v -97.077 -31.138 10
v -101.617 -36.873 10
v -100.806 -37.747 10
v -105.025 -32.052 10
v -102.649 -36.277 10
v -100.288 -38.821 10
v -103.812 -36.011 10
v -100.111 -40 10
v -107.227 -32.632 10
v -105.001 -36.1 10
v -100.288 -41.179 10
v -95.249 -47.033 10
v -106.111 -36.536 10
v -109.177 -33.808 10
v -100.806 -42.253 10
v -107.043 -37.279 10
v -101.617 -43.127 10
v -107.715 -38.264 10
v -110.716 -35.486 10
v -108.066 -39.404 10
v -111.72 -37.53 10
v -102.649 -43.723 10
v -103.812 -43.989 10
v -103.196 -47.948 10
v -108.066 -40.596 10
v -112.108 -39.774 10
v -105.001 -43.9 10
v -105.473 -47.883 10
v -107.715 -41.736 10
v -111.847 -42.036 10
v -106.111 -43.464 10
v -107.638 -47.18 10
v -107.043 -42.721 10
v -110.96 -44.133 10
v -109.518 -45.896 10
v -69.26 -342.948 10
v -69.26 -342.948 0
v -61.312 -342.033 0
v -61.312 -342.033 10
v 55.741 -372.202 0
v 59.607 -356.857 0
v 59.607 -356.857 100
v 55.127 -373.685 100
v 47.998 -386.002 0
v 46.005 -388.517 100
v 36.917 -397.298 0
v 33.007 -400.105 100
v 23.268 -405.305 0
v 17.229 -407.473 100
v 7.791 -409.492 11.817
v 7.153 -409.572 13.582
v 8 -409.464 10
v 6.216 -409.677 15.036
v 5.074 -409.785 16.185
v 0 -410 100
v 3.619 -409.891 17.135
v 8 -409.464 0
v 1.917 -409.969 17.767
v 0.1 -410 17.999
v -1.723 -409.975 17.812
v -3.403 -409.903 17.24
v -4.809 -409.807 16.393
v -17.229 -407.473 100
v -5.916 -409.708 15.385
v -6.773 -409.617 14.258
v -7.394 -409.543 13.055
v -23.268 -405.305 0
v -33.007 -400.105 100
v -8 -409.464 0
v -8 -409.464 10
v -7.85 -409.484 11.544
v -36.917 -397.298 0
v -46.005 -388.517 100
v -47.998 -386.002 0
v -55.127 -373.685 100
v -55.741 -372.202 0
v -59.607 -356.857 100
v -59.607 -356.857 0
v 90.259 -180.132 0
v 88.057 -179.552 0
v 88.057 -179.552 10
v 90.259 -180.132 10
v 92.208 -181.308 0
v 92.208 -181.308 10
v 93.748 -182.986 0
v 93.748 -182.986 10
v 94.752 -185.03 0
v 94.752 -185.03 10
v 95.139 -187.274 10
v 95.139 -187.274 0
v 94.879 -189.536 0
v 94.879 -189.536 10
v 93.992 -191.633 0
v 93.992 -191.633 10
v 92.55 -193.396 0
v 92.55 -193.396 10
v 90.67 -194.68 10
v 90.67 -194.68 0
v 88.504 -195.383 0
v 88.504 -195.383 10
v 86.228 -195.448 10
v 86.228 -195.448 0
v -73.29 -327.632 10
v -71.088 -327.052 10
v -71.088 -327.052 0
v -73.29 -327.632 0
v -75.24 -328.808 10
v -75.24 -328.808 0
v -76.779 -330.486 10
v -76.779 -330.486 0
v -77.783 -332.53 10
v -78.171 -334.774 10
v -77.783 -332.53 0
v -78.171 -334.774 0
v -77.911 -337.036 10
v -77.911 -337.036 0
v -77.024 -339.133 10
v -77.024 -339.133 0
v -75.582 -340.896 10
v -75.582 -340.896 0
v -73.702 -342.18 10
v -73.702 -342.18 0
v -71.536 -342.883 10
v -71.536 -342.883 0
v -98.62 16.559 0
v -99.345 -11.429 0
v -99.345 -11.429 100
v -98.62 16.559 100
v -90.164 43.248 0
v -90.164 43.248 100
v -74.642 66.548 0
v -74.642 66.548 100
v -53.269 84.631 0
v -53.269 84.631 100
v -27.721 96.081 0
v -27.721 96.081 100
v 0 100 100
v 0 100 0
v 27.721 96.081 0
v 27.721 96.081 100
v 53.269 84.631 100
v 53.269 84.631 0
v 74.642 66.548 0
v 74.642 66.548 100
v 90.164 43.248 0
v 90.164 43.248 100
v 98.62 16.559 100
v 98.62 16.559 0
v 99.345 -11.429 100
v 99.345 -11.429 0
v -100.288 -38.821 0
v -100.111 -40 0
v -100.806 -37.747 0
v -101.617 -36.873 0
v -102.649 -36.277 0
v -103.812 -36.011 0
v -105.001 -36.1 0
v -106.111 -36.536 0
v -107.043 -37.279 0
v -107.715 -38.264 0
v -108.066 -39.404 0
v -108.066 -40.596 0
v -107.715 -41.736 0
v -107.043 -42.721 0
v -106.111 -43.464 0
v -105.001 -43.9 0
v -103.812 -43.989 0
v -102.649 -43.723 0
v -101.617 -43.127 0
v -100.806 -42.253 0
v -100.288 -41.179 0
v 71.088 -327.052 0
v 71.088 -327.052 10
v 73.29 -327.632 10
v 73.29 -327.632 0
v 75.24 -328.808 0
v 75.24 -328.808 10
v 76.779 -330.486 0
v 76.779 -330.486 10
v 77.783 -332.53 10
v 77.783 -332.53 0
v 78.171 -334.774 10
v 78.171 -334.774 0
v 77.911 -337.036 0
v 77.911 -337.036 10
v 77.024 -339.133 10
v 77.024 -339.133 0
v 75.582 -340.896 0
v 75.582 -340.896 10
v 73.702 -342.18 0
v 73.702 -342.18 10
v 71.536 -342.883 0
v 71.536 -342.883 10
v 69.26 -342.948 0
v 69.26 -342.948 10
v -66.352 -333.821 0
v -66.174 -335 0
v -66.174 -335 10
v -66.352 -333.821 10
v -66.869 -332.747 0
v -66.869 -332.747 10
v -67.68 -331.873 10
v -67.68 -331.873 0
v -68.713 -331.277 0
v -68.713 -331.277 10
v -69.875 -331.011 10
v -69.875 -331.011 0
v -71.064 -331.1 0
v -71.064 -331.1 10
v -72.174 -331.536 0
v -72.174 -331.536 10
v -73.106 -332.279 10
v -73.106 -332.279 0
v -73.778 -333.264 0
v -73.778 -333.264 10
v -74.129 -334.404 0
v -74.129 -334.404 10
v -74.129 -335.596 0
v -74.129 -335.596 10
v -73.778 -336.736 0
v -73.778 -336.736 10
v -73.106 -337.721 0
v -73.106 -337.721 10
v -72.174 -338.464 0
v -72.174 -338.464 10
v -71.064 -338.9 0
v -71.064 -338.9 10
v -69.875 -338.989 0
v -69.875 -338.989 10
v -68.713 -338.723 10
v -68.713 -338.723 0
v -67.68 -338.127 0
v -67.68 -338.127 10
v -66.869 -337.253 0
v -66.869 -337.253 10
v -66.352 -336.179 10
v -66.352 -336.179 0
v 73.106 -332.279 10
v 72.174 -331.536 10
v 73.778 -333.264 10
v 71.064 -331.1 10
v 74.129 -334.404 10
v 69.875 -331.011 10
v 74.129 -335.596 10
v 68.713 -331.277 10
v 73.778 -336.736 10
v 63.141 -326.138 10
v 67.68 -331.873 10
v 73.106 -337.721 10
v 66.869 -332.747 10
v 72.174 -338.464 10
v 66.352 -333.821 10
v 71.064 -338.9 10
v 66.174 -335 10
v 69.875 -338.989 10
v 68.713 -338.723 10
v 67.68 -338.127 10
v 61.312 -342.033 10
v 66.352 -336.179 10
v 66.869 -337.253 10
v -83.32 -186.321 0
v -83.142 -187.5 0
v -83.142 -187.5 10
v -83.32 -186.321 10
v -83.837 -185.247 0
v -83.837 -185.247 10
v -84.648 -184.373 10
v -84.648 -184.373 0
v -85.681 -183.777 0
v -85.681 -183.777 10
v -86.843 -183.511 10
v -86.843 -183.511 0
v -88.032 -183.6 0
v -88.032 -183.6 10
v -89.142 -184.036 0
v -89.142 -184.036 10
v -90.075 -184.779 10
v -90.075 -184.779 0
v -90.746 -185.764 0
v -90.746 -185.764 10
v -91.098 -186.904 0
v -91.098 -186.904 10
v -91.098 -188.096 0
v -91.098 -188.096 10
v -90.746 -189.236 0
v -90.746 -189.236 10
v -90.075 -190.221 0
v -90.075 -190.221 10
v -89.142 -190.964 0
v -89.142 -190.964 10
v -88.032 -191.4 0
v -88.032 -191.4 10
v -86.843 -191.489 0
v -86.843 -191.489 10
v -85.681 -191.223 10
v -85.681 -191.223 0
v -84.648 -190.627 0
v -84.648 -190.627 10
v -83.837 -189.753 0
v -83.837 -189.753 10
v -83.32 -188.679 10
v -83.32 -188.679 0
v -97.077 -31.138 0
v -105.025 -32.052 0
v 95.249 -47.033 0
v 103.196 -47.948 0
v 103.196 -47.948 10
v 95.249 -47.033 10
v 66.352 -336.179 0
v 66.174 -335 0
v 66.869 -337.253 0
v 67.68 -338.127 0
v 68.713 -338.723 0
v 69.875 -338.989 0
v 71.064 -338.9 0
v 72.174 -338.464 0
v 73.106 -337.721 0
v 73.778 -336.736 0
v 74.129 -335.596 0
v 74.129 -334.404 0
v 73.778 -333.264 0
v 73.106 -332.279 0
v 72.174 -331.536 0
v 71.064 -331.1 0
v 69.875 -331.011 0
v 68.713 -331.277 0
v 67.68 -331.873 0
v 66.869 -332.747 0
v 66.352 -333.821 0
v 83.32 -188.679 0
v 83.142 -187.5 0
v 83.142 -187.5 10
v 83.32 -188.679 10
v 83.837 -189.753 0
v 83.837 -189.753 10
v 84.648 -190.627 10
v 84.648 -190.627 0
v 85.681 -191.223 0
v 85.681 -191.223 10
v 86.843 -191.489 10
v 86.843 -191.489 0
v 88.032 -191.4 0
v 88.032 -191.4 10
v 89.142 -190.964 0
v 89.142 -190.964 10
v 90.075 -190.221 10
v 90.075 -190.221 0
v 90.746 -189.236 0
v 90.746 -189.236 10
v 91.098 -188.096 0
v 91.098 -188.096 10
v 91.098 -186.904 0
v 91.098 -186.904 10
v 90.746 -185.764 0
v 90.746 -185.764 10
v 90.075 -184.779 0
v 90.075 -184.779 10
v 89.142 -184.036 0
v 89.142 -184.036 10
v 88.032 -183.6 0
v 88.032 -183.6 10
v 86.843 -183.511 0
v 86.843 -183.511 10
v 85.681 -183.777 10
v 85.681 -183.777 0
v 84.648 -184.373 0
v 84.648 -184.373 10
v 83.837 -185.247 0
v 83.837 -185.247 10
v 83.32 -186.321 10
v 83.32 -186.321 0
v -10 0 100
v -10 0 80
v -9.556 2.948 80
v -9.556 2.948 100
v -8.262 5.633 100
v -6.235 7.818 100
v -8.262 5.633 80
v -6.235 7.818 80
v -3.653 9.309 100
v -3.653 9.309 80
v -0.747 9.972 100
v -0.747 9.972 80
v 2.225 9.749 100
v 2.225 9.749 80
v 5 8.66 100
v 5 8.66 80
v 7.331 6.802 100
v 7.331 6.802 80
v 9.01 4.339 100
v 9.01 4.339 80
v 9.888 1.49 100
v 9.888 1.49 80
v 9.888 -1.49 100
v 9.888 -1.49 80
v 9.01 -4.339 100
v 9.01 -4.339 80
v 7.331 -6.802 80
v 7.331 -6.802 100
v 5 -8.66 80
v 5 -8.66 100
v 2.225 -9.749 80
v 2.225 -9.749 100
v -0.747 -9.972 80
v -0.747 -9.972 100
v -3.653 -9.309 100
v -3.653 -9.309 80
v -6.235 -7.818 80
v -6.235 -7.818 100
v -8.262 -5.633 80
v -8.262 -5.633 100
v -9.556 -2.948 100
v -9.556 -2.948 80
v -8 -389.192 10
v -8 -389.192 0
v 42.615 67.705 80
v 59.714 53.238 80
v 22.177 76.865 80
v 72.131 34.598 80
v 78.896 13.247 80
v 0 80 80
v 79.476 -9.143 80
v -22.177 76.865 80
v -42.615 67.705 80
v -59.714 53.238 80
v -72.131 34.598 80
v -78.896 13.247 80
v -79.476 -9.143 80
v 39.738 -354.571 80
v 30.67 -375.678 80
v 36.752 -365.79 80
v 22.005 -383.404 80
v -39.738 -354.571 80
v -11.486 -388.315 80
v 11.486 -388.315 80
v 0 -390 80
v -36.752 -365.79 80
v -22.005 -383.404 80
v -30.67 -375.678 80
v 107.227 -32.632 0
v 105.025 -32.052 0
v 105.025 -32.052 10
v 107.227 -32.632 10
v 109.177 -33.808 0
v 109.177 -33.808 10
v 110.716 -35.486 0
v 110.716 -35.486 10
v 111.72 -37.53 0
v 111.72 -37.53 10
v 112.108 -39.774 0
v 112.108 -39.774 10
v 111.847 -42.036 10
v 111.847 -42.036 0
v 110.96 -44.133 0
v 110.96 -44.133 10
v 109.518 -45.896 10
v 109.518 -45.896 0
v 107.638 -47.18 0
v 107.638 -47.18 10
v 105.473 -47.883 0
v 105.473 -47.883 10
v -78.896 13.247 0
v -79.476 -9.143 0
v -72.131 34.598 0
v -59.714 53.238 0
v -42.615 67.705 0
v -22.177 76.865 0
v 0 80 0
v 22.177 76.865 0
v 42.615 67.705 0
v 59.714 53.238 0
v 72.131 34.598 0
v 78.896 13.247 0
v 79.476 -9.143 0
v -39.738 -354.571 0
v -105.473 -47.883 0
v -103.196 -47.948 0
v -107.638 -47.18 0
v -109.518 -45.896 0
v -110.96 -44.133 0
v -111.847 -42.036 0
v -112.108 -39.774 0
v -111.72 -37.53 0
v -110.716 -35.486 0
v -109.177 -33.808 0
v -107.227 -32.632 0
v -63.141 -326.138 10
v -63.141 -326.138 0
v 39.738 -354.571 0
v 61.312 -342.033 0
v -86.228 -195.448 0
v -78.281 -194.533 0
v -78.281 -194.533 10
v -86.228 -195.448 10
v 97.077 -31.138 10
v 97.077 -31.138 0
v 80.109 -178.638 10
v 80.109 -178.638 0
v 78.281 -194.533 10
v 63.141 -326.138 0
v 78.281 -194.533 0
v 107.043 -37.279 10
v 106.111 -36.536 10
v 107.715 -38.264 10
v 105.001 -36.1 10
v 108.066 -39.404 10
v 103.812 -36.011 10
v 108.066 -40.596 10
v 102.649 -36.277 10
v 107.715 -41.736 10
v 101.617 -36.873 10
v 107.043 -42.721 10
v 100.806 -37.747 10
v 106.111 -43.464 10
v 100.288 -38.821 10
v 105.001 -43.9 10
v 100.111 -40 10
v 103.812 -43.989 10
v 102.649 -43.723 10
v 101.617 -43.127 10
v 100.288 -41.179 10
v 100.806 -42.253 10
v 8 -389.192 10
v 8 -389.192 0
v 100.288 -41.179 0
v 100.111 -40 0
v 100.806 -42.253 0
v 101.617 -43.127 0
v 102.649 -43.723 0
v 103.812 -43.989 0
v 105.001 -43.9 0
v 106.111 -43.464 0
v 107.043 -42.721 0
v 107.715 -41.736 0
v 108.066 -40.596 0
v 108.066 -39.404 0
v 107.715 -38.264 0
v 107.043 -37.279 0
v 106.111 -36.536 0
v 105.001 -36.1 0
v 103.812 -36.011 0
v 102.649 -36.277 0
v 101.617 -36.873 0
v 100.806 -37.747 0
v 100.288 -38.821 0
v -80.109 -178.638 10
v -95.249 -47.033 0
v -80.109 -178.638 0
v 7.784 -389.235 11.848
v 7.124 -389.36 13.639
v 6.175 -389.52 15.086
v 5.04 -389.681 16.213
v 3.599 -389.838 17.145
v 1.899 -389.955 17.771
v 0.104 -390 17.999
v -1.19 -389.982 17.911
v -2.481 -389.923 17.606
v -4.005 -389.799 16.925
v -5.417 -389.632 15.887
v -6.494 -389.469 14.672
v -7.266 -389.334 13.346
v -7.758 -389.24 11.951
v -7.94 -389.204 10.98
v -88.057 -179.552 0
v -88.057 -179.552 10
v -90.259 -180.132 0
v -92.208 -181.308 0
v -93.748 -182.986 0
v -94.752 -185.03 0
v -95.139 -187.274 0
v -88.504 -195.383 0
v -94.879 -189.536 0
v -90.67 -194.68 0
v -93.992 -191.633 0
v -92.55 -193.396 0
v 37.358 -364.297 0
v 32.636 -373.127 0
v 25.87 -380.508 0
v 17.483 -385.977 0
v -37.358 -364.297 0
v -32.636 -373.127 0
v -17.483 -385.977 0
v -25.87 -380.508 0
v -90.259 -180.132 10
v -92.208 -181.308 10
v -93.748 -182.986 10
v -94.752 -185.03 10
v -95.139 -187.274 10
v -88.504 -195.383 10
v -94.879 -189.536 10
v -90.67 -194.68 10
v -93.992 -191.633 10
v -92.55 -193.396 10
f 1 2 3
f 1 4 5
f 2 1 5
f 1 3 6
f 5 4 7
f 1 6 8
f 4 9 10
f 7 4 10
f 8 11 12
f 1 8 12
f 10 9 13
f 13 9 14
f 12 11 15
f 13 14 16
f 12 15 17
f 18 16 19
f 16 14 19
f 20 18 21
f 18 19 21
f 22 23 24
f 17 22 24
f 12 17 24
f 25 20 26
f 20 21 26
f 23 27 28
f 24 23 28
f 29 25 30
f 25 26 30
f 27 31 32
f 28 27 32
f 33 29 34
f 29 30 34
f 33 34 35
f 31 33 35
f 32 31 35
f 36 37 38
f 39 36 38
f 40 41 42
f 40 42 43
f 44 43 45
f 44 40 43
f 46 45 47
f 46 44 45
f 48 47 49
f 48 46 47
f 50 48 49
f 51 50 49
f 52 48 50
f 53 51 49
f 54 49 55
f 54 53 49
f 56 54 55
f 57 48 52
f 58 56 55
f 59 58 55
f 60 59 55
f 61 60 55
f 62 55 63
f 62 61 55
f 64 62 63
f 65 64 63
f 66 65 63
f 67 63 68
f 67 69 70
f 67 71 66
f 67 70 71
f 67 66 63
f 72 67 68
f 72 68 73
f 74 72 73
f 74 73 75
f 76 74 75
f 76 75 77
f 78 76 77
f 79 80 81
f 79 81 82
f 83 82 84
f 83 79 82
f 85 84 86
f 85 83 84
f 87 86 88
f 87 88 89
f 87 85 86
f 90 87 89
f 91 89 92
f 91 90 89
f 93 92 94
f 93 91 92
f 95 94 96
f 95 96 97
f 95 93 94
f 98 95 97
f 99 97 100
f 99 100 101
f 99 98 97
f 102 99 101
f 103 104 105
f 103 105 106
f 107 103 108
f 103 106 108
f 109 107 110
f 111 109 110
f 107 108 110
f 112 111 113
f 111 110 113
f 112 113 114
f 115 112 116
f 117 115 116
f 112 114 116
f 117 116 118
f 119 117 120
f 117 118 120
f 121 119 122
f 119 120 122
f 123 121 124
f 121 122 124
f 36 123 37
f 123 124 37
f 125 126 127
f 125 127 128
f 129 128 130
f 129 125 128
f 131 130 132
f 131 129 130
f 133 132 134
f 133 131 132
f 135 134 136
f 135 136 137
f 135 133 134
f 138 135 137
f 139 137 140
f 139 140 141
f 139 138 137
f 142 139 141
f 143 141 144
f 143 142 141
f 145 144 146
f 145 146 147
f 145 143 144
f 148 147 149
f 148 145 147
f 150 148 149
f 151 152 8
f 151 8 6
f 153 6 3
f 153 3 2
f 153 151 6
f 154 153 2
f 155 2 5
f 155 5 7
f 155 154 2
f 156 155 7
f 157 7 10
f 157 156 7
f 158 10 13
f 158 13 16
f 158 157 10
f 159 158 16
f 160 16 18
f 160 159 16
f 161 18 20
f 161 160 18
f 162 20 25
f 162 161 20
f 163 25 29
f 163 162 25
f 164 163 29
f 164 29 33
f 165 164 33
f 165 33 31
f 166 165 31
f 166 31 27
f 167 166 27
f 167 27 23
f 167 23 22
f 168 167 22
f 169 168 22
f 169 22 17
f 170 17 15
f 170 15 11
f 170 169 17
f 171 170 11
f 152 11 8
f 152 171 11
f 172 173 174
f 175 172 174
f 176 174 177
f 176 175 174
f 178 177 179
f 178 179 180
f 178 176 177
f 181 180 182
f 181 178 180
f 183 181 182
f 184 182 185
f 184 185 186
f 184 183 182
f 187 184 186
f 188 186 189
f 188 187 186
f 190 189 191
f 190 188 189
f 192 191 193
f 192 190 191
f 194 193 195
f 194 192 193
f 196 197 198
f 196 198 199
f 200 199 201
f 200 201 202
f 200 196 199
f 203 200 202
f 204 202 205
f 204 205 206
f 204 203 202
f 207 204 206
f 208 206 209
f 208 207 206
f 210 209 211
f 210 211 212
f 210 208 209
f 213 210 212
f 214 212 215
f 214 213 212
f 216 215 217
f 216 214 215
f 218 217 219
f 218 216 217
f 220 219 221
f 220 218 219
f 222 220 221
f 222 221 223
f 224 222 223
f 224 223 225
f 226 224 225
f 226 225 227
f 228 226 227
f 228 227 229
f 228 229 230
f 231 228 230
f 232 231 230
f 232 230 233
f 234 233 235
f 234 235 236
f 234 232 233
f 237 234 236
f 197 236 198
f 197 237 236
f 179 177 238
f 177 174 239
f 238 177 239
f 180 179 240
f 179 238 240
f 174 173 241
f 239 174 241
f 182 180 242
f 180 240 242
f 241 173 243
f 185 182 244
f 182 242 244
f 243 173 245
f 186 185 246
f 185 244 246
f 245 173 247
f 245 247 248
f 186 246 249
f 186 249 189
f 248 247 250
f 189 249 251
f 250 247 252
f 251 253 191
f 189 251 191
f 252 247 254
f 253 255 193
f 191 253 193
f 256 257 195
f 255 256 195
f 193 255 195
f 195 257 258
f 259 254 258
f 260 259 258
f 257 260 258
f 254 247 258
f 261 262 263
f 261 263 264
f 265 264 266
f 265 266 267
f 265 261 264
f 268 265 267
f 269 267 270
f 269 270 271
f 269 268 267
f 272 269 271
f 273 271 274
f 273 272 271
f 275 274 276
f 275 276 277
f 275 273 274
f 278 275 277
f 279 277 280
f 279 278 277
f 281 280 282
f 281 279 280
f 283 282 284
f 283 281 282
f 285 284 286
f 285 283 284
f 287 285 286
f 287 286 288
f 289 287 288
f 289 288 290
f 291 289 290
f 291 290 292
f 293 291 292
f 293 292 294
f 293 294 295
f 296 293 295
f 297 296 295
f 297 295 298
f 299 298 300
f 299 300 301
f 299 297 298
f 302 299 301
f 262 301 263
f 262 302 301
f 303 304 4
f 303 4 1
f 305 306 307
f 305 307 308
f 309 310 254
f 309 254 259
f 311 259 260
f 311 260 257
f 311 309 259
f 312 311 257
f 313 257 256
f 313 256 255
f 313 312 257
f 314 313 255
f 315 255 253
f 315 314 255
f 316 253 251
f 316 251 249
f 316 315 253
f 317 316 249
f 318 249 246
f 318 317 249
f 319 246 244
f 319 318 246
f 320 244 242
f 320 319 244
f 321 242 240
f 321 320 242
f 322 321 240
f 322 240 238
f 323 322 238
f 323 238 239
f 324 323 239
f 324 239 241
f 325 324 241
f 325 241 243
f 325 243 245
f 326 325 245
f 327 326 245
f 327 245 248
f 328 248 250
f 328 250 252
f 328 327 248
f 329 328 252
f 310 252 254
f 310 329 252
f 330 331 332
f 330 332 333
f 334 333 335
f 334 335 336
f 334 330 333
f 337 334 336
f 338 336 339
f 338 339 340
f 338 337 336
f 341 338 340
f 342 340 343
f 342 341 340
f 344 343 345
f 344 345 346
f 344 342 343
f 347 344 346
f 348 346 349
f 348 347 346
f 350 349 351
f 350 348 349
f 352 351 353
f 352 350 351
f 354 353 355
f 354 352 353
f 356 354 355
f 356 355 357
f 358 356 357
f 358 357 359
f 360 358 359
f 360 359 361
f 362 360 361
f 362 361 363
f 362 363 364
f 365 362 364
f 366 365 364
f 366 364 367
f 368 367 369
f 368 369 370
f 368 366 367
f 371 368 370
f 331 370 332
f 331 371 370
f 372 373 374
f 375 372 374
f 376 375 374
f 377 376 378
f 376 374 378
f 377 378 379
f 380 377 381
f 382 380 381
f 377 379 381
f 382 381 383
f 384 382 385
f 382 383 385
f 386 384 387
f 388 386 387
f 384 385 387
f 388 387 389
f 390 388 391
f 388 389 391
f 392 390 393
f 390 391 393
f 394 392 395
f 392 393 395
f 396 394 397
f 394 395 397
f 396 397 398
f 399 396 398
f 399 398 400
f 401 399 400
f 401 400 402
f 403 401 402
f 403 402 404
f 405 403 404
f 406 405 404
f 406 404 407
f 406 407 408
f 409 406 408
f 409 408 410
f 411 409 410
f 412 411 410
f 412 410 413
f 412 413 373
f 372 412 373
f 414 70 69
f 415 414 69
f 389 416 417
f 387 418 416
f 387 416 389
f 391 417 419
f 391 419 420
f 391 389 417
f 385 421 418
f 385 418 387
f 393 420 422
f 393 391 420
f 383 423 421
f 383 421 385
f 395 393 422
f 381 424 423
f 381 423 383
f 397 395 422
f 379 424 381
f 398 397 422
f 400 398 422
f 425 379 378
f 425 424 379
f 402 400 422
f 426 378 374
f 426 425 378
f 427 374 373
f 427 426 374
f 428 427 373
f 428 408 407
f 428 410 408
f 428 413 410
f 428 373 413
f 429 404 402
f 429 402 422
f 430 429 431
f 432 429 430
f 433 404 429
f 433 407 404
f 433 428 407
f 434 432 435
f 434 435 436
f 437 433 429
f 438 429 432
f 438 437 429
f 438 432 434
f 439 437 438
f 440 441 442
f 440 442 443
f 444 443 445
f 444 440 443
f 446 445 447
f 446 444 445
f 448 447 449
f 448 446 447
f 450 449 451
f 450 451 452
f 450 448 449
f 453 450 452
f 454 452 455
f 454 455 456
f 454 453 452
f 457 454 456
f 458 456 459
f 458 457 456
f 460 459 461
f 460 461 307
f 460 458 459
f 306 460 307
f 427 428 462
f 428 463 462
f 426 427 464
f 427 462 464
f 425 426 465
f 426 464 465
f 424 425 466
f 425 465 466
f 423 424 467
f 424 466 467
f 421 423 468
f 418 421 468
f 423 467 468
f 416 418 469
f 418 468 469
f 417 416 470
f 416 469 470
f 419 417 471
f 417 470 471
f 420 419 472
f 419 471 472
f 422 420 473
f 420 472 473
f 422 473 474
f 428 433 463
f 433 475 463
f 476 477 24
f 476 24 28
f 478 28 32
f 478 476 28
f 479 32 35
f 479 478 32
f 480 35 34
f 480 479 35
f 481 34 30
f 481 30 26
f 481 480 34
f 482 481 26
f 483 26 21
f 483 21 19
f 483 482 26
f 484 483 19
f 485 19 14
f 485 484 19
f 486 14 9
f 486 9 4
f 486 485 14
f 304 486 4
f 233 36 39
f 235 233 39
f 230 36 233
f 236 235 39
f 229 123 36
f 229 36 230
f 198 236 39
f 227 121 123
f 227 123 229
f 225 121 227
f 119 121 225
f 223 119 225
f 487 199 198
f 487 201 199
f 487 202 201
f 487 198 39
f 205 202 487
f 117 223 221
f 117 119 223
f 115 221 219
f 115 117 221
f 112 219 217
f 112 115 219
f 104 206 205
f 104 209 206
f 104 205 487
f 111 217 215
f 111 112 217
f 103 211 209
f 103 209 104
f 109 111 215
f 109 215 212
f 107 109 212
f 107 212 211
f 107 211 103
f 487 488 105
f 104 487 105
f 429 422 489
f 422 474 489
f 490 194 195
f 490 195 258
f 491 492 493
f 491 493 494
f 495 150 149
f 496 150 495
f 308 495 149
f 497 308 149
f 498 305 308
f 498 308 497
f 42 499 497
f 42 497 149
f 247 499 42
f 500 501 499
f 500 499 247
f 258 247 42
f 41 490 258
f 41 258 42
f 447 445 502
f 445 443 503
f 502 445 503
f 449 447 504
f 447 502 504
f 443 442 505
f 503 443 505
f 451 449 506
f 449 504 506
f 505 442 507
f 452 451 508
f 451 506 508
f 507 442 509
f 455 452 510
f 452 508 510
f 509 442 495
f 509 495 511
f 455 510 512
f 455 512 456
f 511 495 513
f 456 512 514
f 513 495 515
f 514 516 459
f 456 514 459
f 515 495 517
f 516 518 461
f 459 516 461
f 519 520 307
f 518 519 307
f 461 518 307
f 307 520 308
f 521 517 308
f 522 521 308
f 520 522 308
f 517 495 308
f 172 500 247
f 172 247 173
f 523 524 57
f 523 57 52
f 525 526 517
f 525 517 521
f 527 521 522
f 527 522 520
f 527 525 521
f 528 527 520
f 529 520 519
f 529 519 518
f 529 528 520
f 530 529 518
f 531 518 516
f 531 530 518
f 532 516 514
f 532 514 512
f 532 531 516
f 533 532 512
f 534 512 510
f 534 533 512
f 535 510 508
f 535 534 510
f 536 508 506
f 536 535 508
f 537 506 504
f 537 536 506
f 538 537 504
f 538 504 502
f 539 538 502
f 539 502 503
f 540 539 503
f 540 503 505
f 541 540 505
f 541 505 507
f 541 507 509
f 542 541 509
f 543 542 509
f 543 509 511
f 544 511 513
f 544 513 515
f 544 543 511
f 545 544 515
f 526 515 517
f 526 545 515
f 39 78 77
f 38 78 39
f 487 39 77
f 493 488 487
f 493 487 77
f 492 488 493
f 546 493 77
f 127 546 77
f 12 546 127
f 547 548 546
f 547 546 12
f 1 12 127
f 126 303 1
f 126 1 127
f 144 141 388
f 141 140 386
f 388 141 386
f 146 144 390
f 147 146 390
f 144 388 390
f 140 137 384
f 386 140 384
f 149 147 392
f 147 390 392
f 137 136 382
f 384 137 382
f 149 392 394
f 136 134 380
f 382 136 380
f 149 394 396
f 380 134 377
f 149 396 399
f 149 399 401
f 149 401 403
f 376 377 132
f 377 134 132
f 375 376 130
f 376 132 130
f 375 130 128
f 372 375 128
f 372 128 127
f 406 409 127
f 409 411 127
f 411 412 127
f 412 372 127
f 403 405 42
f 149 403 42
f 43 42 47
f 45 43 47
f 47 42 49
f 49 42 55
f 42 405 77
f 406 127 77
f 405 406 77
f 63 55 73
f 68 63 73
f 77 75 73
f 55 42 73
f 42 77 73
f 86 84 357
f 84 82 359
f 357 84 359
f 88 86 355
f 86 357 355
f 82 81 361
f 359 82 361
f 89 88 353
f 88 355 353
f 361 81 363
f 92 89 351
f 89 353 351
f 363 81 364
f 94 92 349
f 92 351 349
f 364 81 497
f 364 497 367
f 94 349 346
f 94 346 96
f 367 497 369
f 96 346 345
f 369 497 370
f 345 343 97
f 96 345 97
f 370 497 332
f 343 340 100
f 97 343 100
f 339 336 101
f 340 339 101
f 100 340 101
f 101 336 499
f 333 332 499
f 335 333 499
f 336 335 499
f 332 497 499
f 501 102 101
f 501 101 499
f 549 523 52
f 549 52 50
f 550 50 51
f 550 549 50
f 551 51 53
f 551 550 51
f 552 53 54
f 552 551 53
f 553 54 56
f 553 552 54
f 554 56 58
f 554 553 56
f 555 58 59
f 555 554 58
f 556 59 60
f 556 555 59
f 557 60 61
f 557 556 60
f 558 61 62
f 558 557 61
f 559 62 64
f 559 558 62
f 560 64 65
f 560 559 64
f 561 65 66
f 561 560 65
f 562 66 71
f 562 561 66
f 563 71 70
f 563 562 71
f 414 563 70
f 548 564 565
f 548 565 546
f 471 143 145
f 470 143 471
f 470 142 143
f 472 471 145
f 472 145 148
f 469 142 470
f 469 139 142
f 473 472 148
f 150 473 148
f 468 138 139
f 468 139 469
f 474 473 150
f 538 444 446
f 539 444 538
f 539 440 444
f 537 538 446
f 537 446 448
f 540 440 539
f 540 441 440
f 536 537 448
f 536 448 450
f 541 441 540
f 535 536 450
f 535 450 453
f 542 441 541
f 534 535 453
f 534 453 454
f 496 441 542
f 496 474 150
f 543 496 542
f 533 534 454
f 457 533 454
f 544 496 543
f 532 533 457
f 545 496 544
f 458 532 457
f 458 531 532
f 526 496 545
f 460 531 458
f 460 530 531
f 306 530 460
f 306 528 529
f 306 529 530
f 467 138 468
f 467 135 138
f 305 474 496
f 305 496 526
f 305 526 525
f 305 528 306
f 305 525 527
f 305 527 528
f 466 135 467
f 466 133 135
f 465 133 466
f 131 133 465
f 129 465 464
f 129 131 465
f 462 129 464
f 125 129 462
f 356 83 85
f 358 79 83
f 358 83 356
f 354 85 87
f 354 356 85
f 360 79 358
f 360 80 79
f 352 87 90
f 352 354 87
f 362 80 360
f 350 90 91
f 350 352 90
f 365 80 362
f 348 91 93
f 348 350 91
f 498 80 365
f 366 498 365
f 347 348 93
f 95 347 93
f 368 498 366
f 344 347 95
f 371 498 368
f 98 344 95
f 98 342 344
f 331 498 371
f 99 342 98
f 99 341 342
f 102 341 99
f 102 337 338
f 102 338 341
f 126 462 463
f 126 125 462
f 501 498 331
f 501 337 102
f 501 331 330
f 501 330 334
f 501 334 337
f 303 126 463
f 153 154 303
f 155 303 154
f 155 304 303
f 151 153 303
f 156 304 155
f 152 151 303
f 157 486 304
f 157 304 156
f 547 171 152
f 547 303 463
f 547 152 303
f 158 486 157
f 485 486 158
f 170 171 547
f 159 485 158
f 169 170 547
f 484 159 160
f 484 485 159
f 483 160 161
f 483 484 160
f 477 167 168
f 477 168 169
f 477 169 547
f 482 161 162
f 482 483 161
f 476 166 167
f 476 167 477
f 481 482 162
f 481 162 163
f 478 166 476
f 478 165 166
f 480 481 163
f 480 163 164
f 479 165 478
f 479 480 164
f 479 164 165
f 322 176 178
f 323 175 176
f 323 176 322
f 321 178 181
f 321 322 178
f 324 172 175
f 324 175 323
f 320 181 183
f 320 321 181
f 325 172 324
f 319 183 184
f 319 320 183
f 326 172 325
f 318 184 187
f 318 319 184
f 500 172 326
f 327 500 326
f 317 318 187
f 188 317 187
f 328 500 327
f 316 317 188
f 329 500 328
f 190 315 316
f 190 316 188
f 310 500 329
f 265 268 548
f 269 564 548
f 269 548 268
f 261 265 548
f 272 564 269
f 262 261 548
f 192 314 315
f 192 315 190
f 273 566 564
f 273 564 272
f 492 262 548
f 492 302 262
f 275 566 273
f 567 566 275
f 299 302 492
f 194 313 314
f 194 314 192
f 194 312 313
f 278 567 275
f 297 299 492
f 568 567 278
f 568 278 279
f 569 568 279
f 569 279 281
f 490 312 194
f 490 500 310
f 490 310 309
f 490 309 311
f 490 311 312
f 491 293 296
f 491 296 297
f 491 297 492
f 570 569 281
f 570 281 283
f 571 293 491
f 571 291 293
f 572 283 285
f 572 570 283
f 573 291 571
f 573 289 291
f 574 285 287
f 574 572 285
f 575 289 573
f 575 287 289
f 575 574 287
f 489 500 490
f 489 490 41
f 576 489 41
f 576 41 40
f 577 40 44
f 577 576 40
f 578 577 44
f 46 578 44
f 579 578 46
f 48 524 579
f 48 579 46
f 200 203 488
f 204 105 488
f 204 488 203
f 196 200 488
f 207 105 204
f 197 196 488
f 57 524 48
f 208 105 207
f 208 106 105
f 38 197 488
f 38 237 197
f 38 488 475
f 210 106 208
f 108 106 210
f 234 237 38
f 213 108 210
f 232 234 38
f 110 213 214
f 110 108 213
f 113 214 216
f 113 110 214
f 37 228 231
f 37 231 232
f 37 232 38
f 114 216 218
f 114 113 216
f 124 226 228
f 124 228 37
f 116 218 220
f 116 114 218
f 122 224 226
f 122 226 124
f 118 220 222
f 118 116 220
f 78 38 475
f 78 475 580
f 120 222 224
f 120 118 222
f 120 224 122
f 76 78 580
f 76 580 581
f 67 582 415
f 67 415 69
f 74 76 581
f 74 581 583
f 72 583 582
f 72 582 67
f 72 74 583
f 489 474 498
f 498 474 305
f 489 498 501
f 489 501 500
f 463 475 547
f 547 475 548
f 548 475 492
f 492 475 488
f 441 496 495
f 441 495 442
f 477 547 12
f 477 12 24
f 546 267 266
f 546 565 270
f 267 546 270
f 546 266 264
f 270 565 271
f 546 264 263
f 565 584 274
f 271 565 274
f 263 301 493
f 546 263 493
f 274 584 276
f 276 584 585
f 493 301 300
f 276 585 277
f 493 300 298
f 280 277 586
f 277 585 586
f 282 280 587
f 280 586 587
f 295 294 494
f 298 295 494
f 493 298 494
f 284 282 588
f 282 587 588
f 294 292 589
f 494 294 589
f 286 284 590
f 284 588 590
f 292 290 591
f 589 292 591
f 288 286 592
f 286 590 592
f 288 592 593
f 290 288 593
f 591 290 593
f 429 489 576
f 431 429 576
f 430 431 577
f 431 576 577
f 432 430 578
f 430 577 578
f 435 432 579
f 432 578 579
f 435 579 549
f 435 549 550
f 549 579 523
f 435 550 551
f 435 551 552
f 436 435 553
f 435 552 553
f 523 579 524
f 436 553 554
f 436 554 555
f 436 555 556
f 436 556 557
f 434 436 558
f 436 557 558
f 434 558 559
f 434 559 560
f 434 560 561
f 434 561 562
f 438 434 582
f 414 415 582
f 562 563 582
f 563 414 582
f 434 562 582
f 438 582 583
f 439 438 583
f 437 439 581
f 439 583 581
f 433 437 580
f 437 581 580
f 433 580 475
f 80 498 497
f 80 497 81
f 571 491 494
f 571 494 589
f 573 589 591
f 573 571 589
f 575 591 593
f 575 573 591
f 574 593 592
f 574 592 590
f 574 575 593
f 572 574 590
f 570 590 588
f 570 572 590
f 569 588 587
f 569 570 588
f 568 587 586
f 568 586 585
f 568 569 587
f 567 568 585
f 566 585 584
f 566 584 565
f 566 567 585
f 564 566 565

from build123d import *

# Parameters (mm, degrees)
BOSS_EXTRUDE1_DEPTH = 100
SHELL1_T            = -20
SKETCH7_R           = 10
CUT_EXTRUDE2_DEPTH  = 39
SKETCH8_R           = 4
BOSS_EXTRUDE2_DEPTH = 10
CUT_EXTRUDE3_DEPTH  = 423


with BuildPart() as part:
    # Sketch1 → Boss-Extrude1 (new body)
    with BuildSketch(Plane(origin=(0, 0, 0), x_dir=(0, 1, 0), z_dir=(0, 0, 1))):
        with BuildLine():
            Line((-356.857142857, 59.606875374), (-11.428571429, 99.34479229))
            ThreePointArc((-11.428571429, 99.34479229), (100, 0), (-11.428571429, -99.34479229))
            Line((-11.428571429, -99.34479229), (-356.857142857, -59.606875374))
            ThreePointArc((-356.857142857, -59.606875374), (-410, 0), (-356.857142857, 59.606875374))
        make_face()
    extrude(amount=BOSS_EXTRUDE1_DEPTH)

    # Shell1
    shell1_openings = [part.faces().sort_by_distance(p)[0] for p in [
        (0, -135.081480523, 0),
    ]]
    offset(amount=SHELL1_T, openings=shell1_openings, kind=Kind.INTERSECTION)

    # Sketch7 → Cut-Extrude2 (cut)
    with BuildSketch(Plane(origin=(0, 0, 80), x_dir=(1, 0, 0), z_dir=(0, 0, -1))):
        with Locations(Location((0, 0, 0), (0, 0, 180))):
            Circle(SKETCH7_R)
    extrude(amount=-CUT_EXTRUDE2_DEPTH, mode=Mode.SUBTRACT)

    # Sketch8 → Boss-Extrude2 (add)
    # profile 1 of 6: a face of its own
    with BuildSketch(Plane(origin=(0, 0, 0), x_dir=(0, 1, 0), z_dir=(0, 0, 1))):
        with BuildLine():
            Line((-342.947583383, 69.259785928), (-342.033297669, 61.312202545))
            Line((-342.033297669, 61.312202545), (-326.138130903, 63.140773973))
            Line((-326.138130903, 63.140773973), (-327.052416617, 71.088357357))
            ThreePointArc((-327.052416617, 71.088357357), (-335.914285714, 78.121655025), (-342.947583383, 69.259785928))
        make_face()
        with Locations(Location((-335, 70.174071642, 0), (0, 0, 270))):
            Circle(SKETCH8_R, mode=Mode.SUBTRACT)
    # profile 2 of 6: a face of its own
    with BuildSketch(Plane(origin=(0, 0, 0), x_dir=(0, 1, 0), z_dir=(0, 0, 1))):
        with BuildLine():
            Line((-179.552416617, 88.056677959), (-178.638130903, 80.109094575))
            Line((-178.638130903, 80.109094575), (-194.533297669, 78.280523147))
            Line((-194.533297669, 78.280523147), (-195.447583383, 86.22810653))
            ThreePointArc((-195.447583383, 86.22810653), (-188.414285714, 95.089975627), (-179.552416617, 88.056677959))
        make_face()
        with Locations(Location((-187.5, 87.142392244, 0), (0, 0, 270))):
            Circle(SKETCH8_R, mode=Mode.SUBTRACT)
    # profile 3 of 6: a face of its own
    with BuildSketch(Plane(origin=(0, 0, 0), x_dir=(0, 1, 0), z_dir=(0, 0, 1))):
        with BuildLine():
            Line((-32.052416617, 105.024998561), (-31.138130903, 97.077415177))
            Line((-31.138130903, 97.077415177), (-47.033297669, 95.248843749))
            Line((-47.033297669, 95.248843749), (-47.947583383, 103.196427132))
            ThreePointArc((-47.947583383, 103.196427132), (-40.914285714, 112.058296229), (-32.052416617, 105.024998561))
        make_face()
        with Locations(Location((-40, 104.110712846, 0), (0, 0, 270))):
            Circle(SKETCH8_R, mode=Mode.SUBTRACT)
    # profile 4 of 6: a face of its own
    with BuildSketch(Plane(origin=(0, 0, 0), x_dir=(0, 1, 0), z_dir=(0, 0, 1))):
        with BuildLine():
            Line((-47.947583383, -103.196427132), (-47.033297669, -95.248843749))
            Line((-47.033297669, -95.248843749), (-31.138130903, -97.077415177))
            Line((-31.138130903, -97.077415177), (-32.052416617, -105.024998561))
            ThreePointArc((-32.052416617, -105.024998561), (-40.914285714, -112.058296229), (-47.947583383, -103.196427132))
        make_face()
        with Locations(Location((-40, -104.110712846, 0), (0, 0, 90))):
            Circle(SKETCH8_R, mode=Mode.SUBTRACT)
    # profile 5 of 6: a face of its own
    with BuildSketch(Plane(origin=(0, 0, 0), x_dir=(0, 1, 0), z_dir=(0, 0, 1))):
        with BuildLine():
            Line((-195.447583383, -86.22810653), (-194.533297669, -78.280523147))
            Line((-194.533297669, -78.280523147), (-178.638130903, -80.109094575))
            Line((-178.638130903, -80.109094575), (-179.552416617, -88.056677959))
            ThreePointArc((-179.552416617, -88.056677959), (-188.414285714, -95.089975627), (-195.447583383, -86.22810653))
        make_face()
        with Locations(Location((-187.5, -87.142392244, 0), (0, 0, 90))):
            Circle(SKETCH8_R, mode=Mode.SUBTRACT)
    # profile 6 of 6: a face of its own
    with BuildSketch(Plane(origin=(0, 0, 0), x_dir=(0, 1, 0), z_dir=(0, 0, 1))):
        with BuildLine():
            Line((-342.033297669, -61.312202545), (-326.138130903, -63.140773973))
            Line((-326.138130903, -63.140773973), (-327.052416617, -71.088357357))
            ThreePointArc((-327.052416617, -71.088357357), (-335.914285714, -78.121655025), (-342.947583383, -69.259785928))
            Line((-342.947583383, -69.259785928), (-342.033297669, -61.312202545))
        make_face()
        with Locations(Location((-335, -70.174071642, 0), (0, 0, 90))):
            Circle(SKETCH8_R, mode=Mode.SUBTRACT)
    extrude(amount=BOSS_EXTRUDE2_DEPTH)

    # Sketch9 → Cut-Extrude3 (cut)
    with BuildSketch(Plane(origin=(0, 0, 0), x_dir=(-1, 0, 0), z_dir=(0, 1, 0))):
        with BuildLine():
            Line((0, 0), (-8, 0))
            Line((-8, 0), (-8, 10))
            ThreePointArc((-8, 10), (0, 18), (8, 10))
            Line((8, 10), (8, 0))
            Line((8, 0), (0, 0))
        make_face()
    extrude(amount=-CUT_EXTRUDE3_DEPTH, mode=Mode.SUBTRACT)


solid = part.part
